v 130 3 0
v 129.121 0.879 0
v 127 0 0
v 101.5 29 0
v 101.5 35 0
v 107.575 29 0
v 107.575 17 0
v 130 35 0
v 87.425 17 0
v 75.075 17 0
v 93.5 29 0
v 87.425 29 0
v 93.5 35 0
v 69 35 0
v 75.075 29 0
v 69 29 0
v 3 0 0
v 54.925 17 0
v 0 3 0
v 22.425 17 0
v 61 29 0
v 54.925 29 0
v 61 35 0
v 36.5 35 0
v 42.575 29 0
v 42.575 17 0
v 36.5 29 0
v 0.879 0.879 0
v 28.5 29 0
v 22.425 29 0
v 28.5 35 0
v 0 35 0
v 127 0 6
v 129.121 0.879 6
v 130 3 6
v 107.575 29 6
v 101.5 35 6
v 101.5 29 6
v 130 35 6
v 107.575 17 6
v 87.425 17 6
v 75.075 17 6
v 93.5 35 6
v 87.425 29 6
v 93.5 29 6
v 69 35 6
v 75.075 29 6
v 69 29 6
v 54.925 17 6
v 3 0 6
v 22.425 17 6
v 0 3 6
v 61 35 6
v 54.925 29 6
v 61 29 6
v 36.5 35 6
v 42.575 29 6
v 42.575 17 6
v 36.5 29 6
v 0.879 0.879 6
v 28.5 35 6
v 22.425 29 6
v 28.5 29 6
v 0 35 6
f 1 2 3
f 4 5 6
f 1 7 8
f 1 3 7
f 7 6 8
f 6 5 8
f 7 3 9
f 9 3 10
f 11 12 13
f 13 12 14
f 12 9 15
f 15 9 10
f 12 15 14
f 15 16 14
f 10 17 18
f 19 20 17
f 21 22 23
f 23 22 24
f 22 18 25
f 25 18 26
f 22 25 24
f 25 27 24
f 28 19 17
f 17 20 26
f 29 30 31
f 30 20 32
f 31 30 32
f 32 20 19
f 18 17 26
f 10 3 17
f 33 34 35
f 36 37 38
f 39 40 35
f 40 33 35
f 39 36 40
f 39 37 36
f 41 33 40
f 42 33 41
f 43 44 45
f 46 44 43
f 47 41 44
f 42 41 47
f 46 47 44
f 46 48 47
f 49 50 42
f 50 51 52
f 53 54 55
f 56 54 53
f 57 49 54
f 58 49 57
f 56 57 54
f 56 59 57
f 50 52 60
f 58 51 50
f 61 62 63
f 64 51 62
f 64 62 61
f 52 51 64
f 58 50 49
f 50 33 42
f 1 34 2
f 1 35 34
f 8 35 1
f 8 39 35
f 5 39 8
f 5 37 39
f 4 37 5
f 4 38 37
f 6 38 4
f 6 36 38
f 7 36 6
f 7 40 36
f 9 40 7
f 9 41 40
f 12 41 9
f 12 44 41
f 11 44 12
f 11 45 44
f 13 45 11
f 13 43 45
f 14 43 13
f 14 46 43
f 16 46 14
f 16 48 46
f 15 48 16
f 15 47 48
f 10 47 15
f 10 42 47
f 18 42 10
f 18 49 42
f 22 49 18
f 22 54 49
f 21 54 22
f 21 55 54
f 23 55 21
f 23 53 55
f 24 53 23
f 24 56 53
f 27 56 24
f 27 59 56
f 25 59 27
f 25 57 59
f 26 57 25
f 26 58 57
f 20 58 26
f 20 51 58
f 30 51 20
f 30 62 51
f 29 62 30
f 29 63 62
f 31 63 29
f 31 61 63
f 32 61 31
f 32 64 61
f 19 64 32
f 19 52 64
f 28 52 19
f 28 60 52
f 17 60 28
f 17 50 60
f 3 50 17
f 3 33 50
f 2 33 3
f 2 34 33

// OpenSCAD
$fn = 32;

// ----------------------------------------------------------------------
// Window plate: 130 x 35 mm, 3 open windows
// ----------------------------------------------------------------------

// --- parameters (mm) ---
profile_height = 6;       // extrusion height
profile_points = 32;      // points of the closed outline

profile = [[0, 3], [0.879, 0.879], [3, 0], [127, 0], [129.121, 0.879], [130, 3], [130, 35], [101.5, 35], [101.5, 29], [107.575, 29], [107.575, 17], [87.425, 17], [87.425, 29], [93.5, 29], [93.5, 35], [69, 35], [69, 29], [75.075, 29], [75.075, 17], [54.925, 17], [54.925, 29], [61, 29], [61, 35], [36.5, 35], [36.5, 29], [42.575, 29], [42.575, 17], [22.425, 17], [22.425, 29], [28.5, 29], [28.5, 35], [0, 35]];  // single closed polygon, 32 points, counter clockwise

// --- the one profile operation ---
linear_extrude(height = profile_height) polygon(points = profile);
